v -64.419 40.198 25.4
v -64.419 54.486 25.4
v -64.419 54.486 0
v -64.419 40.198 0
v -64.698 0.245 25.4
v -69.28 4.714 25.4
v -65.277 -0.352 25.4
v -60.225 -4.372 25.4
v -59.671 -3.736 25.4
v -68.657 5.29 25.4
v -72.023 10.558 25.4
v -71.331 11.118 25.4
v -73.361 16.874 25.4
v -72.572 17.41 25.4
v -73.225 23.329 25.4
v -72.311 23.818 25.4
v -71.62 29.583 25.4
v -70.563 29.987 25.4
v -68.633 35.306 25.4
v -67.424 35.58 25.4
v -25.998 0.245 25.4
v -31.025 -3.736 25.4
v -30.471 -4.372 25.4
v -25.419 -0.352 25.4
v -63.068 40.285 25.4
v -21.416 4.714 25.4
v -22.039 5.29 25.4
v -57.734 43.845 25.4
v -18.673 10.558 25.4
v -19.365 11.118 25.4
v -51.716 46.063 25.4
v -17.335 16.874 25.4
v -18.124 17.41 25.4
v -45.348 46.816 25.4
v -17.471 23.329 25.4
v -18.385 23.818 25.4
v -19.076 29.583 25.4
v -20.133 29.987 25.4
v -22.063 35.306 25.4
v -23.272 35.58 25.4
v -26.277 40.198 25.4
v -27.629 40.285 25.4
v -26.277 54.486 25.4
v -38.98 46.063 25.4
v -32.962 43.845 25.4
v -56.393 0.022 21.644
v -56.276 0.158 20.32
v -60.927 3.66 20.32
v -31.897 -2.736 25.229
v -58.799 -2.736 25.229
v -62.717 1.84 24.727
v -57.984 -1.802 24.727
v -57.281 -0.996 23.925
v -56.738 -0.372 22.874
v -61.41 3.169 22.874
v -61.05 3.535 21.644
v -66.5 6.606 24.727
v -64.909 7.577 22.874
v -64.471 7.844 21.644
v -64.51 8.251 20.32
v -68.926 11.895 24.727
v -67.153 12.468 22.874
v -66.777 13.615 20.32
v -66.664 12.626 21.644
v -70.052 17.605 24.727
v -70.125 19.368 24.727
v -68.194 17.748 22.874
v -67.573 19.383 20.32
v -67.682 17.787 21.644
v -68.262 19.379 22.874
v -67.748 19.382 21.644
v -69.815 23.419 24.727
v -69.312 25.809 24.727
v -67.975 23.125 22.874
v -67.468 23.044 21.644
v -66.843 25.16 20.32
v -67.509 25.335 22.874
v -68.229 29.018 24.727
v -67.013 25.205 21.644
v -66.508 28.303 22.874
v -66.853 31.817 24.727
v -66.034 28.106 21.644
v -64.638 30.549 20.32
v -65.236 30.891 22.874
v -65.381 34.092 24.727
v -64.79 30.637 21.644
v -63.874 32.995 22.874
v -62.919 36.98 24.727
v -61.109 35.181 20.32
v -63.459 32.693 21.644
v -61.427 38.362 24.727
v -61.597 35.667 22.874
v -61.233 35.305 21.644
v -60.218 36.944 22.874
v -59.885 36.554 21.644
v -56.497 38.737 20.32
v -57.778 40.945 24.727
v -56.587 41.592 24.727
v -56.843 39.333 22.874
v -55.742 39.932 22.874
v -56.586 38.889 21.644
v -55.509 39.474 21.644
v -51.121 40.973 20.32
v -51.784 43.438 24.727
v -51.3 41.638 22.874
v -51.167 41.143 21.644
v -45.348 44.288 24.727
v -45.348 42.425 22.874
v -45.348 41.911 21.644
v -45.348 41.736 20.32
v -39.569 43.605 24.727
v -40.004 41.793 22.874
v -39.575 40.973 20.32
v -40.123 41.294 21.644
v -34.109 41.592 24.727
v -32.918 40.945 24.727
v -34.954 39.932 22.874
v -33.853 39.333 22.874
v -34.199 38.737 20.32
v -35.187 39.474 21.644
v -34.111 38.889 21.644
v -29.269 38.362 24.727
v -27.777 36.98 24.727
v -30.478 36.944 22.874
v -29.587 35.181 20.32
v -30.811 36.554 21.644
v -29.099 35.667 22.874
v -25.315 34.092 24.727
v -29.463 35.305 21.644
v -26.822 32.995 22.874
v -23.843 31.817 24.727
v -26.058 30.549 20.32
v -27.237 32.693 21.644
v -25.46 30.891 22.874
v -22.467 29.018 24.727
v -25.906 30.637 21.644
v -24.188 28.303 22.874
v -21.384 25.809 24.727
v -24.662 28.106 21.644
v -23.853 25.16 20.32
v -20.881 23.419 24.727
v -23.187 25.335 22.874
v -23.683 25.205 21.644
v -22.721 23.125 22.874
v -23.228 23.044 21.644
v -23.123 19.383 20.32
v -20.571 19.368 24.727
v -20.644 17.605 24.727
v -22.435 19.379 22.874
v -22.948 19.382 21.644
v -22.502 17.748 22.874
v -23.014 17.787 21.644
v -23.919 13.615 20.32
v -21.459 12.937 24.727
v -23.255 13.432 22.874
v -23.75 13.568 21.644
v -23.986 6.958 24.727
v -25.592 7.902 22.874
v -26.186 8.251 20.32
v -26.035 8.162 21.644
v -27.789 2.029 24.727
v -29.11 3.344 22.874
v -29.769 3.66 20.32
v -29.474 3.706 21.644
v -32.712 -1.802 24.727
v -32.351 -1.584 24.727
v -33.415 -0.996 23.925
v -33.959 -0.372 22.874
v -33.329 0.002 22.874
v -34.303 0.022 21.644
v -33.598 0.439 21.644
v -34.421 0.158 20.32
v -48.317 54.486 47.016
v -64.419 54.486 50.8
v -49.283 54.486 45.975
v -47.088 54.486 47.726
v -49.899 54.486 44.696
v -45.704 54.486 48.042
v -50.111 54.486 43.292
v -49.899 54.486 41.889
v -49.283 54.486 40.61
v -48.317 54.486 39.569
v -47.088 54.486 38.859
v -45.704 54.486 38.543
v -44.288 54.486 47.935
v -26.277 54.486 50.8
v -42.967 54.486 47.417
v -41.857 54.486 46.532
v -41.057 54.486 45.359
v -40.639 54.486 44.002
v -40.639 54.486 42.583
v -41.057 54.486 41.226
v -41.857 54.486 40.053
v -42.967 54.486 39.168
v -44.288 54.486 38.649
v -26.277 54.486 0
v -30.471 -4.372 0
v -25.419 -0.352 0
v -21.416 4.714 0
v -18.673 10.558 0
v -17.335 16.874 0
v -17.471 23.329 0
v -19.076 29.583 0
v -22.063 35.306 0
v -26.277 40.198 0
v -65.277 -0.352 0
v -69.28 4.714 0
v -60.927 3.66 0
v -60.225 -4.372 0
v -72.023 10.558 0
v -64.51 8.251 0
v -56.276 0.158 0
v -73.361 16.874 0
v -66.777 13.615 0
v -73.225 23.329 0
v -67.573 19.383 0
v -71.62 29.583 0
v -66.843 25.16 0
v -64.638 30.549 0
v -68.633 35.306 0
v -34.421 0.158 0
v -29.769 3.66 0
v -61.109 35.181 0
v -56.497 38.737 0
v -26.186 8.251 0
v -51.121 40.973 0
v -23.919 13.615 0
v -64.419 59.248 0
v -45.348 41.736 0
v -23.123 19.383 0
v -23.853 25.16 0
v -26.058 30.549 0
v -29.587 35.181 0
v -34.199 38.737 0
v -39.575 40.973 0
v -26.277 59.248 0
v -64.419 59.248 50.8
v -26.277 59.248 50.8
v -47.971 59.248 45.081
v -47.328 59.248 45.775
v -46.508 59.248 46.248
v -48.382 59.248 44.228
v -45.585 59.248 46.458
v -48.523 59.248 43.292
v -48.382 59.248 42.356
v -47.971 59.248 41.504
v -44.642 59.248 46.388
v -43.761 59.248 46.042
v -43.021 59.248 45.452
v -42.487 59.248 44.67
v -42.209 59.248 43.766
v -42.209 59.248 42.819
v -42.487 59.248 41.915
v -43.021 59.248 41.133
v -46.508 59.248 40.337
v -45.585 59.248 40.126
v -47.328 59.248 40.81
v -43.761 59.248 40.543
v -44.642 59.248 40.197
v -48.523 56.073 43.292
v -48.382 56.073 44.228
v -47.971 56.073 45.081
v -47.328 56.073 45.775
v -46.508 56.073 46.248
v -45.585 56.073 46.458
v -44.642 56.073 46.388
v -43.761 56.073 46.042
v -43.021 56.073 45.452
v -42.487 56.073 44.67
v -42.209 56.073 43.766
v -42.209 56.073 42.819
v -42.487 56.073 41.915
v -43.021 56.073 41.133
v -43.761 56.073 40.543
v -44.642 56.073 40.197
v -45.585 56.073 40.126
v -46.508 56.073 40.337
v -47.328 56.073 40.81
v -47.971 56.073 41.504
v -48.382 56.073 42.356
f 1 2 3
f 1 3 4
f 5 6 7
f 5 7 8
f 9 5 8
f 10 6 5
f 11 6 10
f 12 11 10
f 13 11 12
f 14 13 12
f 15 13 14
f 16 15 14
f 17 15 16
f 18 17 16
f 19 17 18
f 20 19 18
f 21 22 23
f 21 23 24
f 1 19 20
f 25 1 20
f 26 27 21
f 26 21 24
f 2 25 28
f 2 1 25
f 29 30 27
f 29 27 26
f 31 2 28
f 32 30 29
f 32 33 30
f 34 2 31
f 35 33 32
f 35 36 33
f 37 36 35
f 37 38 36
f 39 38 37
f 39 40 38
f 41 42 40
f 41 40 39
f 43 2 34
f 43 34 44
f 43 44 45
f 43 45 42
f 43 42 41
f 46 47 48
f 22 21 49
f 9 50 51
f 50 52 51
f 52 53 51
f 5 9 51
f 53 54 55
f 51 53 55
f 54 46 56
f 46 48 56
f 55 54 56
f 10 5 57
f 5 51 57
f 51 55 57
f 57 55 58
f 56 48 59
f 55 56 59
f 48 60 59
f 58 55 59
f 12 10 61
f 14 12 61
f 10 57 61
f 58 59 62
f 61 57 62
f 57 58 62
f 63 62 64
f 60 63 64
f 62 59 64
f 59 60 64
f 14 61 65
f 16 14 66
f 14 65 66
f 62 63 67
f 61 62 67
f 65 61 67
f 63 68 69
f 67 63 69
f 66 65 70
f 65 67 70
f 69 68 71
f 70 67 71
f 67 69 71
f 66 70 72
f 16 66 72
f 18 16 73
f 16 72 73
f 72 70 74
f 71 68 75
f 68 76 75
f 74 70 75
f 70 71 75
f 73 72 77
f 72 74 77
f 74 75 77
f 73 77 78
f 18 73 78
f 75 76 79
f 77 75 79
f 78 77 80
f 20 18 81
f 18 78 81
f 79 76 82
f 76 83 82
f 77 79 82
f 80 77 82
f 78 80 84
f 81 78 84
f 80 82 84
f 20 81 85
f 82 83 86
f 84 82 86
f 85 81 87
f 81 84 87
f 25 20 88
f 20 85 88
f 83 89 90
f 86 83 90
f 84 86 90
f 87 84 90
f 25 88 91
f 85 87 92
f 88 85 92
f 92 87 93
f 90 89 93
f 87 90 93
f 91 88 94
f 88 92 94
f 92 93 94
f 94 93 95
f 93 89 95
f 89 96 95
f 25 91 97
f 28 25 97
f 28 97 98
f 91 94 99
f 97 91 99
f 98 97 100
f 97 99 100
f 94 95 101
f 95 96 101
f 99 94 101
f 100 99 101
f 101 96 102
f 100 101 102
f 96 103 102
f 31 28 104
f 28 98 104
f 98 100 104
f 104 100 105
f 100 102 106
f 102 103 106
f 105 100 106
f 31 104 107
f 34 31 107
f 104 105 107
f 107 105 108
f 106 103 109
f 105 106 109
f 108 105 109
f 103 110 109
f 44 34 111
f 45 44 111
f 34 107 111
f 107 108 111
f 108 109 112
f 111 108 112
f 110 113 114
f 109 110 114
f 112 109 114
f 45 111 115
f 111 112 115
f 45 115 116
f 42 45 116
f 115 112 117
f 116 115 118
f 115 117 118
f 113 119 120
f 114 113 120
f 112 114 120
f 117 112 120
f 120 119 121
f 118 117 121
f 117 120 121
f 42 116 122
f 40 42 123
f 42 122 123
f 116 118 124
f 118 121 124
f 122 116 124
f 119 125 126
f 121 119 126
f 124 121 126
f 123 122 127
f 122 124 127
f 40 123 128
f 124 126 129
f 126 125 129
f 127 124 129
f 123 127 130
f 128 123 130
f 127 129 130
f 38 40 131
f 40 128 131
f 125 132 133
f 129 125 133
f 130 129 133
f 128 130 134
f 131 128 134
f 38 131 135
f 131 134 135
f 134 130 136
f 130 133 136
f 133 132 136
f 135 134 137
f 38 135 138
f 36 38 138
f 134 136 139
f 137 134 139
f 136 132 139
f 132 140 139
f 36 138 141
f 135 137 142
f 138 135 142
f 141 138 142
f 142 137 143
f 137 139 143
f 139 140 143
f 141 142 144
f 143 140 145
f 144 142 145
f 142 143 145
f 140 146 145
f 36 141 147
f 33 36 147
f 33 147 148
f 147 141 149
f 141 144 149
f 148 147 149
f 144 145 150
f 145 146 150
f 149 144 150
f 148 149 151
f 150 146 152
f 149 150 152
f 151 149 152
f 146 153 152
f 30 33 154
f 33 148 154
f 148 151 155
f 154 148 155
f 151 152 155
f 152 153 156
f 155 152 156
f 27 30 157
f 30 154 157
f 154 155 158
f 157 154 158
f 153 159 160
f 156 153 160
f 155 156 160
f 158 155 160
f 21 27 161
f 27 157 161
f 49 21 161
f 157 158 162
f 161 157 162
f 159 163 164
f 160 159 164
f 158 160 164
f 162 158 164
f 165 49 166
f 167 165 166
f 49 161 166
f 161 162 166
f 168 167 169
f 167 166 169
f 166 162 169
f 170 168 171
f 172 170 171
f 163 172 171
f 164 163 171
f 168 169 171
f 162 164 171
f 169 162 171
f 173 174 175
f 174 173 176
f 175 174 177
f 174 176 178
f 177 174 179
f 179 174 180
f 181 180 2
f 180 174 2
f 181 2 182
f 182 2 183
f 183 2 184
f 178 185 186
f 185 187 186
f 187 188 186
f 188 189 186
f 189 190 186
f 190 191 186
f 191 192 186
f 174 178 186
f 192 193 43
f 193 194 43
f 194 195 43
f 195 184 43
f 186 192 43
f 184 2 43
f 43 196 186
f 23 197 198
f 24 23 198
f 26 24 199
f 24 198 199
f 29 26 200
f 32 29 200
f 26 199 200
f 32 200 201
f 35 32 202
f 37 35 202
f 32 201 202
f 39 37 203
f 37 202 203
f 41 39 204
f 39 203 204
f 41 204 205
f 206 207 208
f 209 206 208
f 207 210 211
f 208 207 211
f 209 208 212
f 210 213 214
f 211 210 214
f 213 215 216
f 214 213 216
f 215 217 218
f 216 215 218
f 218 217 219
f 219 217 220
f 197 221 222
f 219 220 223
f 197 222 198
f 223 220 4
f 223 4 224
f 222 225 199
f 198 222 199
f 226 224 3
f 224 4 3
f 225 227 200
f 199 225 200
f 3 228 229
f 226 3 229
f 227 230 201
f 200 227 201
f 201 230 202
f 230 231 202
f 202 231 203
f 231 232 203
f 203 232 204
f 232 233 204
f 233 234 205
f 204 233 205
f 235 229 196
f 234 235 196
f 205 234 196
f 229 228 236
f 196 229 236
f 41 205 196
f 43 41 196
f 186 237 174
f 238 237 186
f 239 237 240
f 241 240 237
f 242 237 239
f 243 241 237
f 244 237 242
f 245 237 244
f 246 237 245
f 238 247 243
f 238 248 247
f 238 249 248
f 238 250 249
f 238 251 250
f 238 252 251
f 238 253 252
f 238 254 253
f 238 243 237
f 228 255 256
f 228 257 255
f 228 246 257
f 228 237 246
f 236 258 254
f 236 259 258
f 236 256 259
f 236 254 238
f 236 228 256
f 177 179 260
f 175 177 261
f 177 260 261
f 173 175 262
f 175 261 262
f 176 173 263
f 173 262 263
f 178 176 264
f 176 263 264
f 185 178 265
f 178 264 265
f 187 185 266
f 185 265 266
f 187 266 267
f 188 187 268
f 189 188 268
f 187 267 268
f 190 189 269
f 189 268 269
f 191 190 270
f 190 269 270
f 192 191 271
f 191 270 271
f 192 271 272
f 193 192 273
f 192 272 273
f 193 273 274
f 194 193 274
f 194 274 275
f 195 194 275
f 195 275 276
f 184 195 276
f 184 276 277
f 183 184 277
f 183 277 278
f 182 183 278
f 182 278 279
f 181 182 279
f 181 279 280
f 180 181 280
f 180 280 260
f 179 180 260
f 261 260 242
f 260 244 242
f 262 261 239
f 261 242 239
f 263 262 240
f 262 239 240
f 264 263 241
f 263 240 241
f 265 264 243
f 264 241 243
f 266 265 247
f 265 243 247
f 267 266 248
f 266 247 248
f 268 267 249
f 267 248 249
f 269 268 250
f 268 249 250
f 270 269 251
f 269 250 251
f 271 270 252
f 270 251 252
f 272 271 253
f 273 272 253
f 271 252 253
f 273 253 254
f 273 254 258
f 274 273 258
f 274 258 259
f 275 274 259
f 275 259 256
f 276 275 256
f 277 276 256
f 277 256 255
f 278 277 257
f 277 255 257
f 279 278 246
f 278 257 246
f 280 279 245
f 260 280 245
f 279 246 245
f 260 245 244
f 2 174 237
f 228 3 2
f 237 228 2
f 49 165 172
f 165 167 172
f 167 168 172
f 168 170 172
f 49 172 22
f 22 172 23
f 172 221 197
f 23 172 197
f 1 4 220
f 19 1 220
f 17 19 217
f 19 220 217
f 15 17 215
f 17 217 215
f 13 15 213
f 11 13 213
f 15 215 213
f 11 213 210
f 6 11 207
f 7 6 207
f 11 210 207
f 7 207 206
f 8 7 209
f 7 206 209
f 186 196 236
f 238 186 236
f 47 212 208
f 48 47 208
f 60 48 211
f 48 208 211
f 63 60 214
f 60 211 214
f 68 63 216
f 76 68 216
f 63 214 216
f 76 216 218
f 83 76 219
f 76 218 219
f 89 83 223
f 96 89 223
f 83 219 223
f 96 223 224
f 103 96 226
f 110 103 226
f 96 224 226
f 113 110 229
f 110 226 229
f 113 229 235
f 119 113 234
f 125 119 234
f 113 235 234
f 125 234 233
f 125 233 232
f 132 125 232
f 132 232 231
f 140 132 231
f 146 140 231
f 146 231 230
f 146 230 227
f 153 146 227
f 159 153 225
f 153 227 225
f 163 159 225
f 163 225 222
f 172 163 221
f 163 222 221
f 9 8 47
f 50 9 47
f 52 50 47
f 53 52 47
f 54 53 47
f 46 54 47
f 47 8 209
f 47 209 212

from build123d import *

# Parameters (mm, degrees)
F1_DEPTH       = 25.4
F0_W           = 38.142491
F0_H           = 4.7625
F2_DEPTH       = 50.8
F4_D           = 6.35
F4_CSINK_D     = 9.525
F4_CSINK_ANGLE = 90
F5_R           = 5.08


with BuildPart() as f1:
    # F0 (on Top) → F1 (new body)
    with BuildSketch(Plane.XY):
        with BuildLine():
            Line((-26.27681, 54.485713), (-64.419301, 54.485713))
            Line((-64.419301, 54.485713), (-64.419301, 49.723213))
            Line((-64.419301, 49.723213), (-64.419301, 40.198213))
            ThreePointArc((-64.419301, 40.198213), (-45.348056, 47.647605), (-26.27681, 40.198213))
            Line((-26.27681, 40.198213), (-26.27681, 49.723213))
            Line((-26.27681, 49.723213), (-26.27681, 54.485713))
        make_face()
        with BuildLine():
            ThreePointArc((-26.27681, 40.198213), (-45.348056, 47.647605), (-64.419301, 40.198213))
            ThreePointArc((-64.419301, 40.198213), (-73.361199, 16.87444), (-60.224942, -4.37161))
            Line((-60.224942, -4.37161), (-56.27555, 0.157641))
            ThreePointArc((-56.27555, 0.157641), (-45.348056, 41.73569), (-34.420562, 0.157641))
            Line((-34.420562, 0.157641), (-30.471169, -4.37161))
            ThreePointArc((-30.471169, -4.37161), (-17.334912, 16.87444), (-26.27681, 40.198213))
        make_face()
    extrude(amount=F1_DEPTH)

    # F0 (on Top) → F2 (join)
    with BuildSketch(Plane.XY):
        with Locations((-45.348055, 56.866963)):
            Rectangle(F0_W, F0_H)
    extrude(amount=F2_DEPTH)

    # F4 (through all)
    with Locations(Plane.XZ.offset(-54.485713)):
        with Locations((-45.348056, 43.292329)):
            CounterSinkHole(F4_D / 2, F4_CSINK_D / 2, counter_sink_angle=F4_CSINK_ANGLE)

    # F5
    f5_edges = [f1.edges().sort_by_distance(p)[0] for p in [
        (-45.348056, 41.73569, 25.4),
    ]]
    fillet(f5_edges, radius=F5_R)


solid = f1.part
